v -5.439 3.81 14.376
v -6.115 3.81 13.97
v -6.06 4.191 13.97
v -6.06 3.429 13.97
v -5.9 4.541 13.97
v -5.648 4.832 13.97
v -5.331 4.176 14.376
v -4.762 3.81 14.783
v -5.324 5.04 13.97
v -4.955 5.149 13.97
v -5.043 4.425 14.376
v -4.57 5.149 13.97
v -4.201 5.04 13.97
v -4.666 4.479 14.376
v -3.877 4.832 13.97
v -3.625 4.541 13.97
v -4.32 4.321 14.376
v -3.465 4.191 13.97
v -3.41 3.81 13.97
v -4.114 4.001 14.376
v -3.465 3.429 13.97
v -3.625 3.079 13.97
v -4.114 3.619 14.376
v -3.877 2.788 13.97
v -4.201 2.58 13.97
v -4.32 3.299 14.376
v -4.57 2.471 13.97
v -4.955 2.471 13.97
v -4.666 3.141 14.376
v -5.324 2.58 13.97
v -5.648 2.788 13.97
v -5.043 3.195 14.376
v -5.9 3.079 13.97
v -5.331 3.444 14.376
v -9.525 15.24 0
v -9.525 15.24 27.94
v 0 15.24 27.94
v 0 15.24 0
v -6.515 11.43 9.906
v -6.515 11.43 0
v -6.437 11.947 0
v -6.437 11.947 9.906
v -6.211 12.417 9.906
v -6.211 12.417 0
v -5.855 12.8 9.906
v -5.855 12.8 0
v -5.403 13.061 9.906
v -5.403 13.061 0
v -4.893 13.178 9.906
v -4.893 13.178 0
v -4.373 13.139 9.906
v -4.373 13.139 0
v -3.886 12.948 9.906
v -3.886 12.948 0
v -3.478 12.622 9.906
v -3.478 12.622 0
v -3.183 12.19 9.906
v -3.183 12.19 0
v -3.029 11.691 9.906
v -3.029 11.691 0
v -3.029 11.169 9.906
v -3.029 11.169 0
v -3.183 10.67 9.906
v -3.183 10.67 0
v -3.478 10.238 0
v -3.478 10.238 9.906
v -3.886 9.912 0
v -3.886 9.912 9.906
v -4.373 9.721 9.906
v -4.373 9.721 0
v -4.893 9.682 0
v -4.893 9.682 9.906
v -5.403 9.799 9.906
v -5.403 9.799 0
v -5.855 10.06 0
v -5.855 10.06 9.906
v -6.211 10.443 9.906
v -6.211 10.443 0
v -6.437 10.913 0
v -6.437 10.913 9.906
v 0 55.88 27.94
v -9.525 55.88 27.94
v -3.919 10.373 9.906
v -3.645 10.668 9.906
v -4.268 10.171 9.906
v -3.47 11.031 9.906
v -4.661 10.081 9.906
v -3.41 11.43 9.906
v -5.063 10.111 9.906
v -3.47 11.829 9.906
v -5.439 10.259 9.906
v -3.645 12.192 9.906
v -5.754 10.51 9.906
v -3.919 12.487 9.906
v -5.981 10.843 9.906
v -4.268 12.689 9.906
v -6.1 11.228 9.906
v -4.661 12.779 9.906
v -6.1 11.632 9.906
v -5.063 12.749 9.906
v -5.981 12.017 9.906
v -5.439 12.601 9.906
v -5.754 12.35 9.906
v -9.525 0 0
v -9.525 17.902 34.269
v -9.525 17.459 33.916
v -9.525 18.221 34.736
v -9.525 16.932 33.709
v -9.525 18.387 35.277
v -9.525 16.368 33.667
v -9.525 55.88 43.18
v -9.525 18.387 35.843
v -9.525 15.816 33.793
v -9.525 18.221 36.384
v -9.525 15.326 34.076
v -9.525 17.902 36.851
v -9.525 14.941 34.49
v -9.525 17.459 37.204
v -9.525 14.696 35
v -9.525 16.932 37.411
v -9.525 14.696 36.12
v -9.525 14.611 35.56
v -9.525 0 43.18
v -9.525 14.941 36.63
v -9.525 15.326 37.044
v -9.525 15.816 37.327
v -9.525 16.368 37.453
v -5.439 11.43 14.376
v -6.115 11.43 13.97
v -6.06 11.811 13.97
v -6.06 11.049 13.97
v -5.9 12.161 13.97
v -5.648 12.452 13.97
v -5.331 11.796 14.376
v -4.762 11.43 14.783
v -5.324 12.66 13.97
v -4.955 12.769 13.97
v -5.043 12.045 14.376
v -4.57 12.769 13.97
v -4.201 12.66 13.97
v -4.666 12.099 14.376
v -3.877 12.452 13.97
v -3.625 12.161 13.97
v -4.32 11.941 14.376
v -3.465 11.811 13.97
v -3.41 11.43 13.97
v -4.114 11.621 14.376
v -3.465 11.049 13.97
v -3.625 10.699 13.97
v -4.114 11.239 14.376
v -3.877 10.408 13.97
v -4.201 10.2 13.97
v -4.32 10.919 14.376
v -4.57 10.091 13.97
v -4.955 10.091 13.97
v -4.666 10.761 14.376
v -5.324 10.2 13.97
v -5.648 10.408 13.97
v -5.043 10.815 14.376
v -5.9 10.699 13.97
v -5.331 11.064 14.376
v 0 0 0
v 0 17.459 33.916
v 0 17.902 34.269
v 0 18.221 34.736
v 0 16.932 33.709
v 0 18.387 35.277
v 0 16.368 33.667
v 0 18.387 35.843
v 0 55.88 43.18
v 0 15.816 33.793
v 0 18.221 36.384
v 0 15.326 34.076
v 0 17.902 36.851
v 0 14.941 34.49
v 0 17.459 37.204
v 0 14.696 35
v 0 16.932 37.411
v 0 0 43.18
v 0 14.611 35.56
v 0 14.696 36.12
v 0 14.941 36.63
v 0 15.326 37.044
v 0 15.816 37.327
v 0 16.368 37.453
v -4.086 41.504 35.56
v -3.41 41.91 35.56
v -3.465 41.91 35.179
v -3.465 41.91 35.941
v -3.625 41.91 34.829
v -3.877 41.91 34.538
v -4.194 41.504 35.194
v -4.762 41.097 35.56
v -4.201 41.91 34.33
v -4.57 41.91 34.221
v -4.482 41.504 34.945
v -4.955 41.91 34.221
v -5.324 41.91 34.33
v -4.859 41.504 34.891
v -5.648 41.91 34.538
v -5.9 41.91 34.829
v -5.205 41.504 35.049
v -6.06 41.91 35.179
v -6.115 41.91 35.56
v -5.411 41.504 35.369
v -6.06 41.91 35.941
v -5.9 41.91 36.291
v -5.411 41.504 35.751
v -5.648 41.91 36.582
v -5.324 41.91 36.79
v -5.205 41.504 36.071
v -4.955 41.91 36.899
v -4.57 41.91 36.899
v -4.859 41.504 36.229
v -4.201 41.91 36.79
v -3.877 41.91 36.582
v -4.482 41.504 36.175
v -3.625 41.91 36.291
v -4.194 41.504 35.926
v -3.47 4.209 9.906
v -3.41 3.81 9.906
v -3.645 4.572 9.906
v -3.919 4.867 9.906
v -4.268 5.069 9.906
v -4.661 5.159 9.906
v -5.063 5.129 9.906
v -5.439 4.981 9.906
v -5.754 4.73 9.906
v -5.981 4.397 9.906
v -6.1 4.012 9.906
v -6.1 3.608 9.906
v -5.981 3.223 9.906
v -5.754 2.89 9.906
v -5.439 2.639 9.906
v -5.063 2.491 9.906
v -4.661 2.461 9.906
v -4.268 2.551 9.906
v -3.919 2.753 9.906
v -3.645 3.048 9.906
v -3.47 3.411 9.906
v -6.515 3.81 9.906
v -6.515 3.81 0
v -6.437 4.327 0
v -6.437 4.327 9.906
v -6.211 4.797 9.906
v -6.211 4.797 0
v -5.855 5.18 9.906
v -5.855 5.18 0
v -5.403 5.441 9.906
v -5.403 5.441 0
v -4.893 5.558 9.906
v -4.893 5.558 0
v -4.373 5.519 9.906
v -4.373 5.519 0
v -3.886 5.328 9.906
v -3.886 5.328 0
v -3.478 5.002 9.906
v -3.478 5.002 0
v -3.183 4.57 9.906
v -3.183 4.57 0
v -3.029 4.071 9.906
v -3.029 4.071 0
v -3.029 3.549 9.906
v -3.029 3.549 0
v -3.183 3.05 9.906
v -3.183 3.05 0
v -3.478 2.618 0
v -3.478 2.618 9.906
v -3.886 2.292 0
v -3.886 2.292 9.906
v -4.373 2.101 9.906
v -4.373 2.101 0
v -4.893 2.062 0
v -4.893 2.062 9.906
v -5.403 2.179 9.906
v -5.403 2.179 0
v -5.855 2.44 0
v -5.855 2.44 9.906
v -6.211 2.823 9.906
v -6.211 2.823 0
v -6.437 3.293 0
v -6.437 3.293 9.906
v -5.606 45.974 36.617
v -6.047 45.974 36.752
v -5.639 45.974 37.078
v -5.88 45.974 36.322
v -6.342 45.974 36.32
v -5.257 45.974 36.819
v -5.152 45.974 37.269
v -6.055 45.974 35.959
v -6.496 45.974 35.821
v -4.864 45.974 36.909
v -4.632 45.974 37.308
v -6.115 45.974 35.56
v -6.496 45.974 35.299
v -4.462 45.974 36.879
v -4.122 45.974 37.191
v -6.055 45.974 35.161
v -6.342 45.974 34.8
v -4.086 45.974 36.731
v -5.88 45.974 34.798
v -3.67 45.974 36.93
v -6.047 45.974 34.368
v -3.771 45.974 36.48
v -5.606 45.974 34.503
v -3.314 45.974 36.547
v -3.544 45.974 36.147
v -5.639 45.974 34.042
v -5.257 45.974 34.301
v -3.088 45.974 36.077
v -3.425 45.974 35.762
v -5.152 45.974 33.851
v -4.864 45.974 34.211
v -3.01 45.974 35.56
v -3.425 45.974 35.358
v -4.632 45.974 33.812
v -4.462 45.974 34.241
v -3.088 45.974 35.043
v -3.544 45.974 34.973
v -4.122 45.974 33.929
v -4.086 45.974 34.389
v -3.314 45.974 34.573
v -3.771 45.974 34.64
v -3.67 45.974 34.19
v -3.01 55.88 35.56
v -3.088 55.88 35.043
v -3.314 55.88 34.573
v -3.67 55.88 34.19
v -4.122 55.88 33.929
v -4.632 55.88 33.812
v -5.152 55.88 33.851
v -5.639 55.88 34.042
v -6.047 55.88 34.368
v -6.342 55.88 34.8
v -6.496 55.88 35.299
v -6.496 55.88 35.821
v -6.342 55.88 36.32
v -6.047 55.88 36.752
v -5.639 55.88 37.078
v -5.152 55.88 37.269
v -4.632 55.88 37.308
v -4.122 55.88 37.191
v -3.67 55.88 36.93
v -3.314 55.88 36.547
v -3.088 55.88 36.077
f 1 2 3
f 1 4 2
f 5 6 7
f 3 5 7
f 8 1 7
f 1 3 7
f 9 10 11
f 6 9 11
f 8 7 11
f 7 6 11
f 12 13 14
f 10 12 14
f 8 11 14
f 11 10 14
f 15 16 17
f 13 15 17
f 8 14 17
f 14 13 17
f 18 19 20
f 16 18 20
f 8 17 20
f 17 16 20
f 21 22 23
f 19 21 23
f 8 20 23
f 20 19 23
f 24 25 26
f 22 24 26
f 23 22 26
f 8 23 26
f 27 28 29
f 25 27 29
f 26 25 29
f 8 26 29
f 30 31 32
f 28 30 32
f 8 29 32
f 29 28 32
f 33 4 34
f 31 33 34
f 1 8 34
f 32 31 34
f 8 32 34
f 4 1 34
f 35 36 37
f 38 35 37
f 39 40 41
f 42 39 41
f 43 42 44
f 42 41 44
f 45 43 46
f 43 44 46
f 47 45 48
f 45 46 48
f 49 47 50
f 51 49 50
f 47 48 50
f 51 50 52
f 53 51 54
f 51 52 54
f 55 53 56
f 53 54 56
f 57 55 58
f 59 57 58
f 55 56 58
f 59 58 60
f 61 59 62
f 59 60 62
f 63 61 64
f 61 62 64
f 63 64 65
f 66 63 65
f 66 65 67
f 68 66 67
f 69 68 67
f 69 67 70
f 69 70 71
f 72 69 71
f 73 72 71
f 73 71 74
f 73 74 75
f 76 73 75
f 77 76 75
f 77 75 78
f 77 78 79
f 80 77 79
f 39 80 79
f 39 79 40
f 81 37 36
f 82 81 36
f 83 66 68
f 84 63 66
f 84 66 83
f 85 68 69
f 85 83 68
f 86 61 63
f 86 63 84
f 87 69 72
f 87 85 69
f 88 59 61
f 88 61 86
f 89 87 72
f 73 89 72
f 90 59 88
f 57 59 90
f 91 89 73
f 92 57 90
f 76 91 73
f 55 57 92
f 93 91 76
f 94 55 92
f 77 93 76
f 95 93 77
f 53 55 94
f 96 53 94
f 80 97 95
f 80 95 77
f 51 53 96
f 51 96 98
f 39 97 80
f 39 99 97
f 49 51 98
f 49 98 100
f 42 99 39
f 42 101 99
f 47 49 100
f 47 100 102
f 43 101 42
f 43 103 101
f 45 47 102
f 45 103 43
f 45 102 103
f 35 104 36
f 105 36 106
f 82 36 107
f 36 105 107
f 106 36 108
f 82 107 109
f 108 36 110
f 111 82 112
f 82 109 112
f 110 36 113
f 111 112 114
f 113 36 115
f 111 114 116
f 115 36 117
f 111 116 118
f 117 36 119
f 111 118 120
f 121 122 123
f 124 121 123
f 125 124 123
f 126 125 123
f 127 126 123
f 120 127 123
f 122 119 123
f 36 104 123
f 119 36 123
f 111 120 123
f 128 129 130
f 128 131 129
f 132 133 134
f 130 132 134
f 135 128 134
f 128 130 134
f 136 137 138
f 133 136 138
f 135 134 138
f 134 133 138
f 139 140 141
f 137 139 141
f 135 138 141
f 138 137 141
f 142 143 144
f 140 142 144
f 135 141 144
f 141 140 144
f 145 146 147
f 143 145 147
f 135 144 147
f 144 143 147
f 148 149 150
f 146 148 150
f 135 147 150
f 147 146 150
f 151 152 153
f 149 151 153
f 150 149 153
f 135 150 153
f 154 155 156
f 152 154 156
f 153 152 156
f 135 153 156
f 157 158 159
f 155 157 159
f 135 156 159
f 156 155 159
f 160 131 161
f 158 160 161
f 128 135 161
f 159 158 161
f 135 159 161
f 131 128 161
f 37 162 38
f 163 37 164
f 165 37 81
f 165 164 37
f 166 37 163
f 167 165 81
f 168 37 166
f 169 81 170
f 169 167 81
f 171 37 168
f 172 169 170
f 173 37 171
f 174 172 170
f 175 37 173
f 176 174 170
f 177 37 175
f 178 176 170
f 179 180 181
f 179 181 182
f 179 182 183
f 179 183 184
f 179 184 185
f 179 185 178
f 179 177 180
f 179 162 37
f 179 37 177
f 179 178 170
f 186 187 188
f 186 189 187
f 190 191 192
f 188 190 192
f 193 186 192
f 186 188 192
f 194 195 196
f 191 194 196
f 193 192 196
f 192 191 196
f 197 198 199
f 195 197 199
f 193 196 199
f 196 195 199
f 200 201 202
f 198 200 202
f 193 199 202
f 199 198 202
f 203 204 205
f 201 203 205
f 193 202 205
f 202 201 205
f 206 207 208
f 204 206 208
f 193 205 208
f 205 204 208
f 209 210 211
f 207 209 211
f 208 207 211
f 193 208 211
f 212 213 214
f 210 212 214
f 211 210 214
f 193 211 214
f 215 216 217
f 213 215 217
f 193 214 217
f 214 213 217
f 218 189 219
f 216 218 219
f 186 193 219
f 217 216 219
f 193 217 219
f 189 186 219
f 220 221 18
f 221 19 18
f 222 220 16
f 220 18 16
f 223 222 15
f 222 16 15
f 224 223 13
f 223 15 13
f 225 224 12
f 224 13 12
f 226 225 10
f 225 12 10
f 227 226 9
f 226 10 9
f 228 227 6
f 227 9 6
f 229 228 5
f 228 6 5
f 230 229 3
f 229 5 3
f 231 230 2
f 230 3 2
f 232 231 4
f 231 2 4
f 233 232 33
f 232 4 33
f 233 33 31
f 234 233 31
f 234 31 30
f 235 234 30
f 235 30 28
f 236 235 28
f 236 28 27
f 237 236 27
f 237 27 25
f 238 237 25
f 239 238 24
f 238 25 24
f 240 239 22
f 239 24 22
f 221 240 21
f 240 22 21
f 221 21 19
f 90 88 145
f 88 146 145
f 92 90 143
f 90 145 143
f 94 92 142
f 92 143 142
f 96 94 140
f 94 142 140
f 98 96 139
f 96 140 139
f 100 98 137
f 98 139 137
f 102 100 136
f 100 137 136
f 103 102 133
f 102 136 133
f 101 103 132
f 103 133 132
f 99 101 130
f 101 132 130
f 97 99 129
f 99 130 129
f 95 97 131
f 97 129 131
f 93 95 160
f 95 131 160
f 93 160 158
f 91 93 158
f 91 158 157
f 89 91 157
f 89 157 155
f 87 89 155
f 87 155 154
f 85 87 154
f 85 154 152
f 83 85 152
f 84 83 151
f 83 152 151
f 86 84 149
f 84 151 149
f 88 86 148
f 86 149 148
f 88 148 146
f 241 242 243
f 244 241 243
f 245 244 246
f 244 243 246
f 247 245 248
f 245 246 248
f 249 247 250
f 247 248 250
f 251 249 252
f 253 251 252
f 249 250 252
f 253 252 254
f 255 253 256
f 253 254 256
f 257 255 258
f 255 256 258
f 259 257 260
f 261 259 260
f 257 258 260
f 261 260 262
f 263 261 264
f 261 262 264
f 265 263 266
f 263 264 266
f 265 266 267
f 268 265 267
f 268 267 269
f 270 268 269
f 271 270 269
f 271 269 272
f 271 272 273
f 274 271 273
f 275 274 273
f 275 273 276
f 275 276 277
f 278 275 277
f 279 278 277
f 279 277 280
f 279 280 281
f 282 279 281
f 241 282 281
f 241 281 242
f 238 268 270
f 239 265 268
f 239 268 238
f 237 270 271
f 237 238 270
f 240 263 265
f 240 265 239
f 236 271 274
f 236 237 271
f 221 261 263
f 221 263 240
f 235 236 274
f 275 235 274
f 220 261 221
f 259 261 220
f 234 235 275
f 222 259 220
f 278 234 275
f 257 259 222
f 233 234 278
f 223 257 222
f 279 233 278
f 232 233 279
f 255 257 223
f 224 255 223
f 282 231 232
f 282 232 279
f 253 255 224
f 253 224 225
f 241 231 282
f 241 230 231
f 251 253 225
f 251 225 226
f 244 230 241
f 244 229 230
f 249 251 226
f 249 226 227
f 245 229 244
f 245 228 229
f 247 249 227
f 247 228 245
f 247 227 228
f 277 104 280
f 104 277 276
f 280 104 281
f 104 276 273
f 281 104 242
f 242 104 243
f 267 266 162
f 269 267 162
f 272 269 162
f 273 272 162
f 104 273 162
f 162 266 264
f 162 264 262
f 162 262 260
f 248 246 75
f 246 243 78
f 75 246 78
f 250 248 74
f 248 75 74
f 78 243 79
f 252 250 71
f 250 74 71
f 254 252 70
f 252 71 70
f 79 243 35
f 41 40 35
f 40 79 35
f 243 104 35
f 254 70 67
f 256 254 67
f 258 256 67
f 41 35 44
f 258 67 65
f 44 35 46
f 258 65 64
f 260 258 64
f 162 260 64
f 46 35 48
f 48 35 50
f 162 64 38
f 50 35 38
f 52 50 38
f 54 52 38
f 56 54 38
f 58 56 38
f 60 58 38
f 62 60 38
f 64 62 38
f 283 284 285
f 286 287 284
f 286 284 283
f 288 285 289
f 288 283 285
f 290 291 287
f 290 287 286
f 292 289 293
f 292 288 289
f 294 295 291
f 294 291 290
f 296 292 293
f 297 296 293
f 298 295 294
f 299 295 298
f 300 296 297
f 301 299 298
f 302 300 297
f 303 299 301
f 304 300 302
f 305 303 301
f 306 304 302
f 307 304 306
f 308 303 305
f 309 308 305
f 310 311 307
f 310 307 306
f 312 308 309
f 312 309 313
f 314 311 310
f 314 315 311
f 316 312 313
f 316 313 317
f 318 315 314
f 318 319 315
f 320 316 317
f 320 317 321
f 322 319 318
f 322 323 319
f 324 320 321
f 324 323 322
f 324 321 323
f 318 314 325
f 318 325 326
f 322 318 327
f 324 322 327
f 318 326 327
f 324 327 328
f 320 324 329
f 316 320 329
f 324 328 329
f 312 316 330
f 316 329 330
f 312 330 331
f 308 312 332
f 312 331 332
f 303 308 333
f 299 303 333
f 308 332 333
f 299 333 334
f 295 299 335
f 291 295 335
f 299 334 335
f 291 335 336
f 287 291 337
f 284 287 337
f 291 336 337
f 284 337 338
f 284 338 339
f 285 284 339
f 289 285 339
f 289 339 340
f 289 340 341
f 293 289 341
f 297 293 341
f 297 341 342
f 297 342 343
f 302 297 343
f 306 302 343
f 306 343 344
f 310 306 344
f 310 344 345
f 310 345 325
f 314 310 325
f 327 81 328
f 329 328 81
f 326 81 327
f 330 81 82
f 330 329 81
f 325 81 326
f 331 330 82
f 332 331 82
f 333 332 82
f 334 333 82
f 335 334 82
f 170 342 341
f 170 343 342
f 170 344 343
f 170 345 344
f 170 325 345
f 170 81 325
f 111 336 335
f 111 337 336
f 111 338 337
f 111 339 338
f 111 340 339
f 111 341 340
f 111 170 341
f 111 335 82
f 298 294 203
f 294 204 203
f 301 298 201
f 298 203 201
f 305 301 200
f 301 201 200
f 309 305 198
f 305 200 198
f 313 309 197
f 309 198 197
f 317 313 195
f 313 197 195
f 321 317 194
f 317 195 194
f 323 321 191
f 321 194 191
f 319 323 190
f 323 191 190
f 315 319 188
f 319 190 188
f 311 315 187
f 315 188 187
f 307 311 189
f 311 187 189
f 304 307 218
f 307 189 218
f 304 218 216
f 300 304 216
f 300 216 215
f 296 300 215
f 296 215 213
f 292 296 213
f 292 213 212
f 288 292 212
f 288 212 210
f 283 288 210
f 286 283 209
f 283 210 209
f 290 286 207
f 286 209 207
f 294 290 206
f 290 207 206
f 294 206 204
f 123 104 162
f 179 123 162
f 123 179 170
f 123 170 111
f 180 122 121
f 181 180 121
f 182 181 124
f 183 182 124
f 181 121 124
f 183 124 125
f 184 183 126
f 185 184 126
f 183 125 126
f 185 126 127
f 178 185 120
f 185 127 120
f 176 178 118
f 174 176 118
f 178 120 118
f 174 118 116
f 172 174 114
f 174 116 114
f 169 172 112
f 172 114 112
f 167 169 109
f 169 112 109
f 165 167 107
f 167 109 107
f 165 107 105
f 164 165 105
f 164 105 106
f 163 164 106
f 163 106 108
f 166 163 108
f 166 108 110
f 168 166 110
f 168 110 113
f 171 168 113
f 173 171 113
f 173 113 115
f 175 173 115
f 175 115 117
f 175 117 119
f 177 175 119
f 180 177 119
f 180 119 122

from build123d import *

# Parameters (mm, degrees)
SKETCH1_W                       = 9.525
SKETCH1_H                       = 15.24
EXTRUDE1_DEPTH                  = 43.18
SKETCH4_W                       = 9.525
SKETCH4_H                       = 15.24
EXTRUDE2_DEPTH                  = 40.64
F_6_32_TAPPED_HOLE1_D           = 2.7051
F_6_32_TAPPED_HOLE1_DEPTH       = 13.97
F_6_32_TAPPED_HOLE1_CBORE_D     = 3.5052
F_6_32_TAPPED_HOLE1_CBORE_DEPTH = 9.906
F_6_32_TAPPED_HOLE1_TIP         = 0.81269403
F_6_CLEARANCE_HOLE1_D           = 3.7973
F_6_CLEARANCE_HOLE1_DEPTH       = 9.906
F_6_CLEARANCE_HOLE1_TIP         = 1.140824014
F_6_32_TAPPED_HOLE2_D           = 2.7051
F_6_32_TAPPED_HOLE2_DEPTH       = 13.97
F_6_32_TAPPED_HOLE2_CBORE_D     = 3.5052
F_6_32_TAPPED_HOLE2_CBORE_DEPTH = 9.906
F_6_32_TAPPED_HOLE2_TIP         = 0.81269403


with BuildPart() as part:
    # Sketch1 → Extrude1 (new body)
    with BuildSketch(Plane.XY):
        with Locations((-4.7625, 7.62)):
            Rectangle(SKETCH1_W, SKETCH1_H)
    extrude(amount=EXTRUDE1_DEPTH)

    # Sketch4 → Extrude2 (add)
    with BuildSketch(Plane(origin=(0, 15.24, 0), x_dir=(-1, 0, 0), z_dir=(0, 1, 0))):
        with Locations((4.7625, 35.56)):
            Rectangle(SKETCH4_W, SKETCH4_H)
    extrude(amount=EXTRUDE2_DEPTH)

    # #6-32 Tapped Hole1
    with Locations(Plane(origin=(-4.7625, 11.43, 0), x_dir=(-1, 0, 0), z_dir=(0, 0, -1))):
        with Locations((0, 0), (0, -7.62), (15.003961831, 4.683879058)):
            CounterBoreHole(F_6_32_TAPPED_HOLE1_D / 2, F_6_32_TAPPED_HOLE1_CBORE_D / 2, F_6_32_TAPPED_HOLE1_CBORE_DEPTH, depth=F_6_32_TAPPED_HOLE1_DEPTH)
            with Locations((0, 0, -(F_6_32_TAPPED_HOLE1_DEPTH + F_6_32_TAPPED_HOLE1_TIP / 2))):  # 118° drill point
                Cone(0, F_6_32_TAPPED_HOLE1_D / 2, F_6_32_TAPPED_HOLE1_TIP, mode=Mode.SUBTRACT)

    # #6 Clearance Hole1
    with Locations(Plane(origin=(0, 16.51, 35.56), x_dir=(0, 1, 0), z_dir=(1, 0, 0))):
        with Locations((0, 0)):
            Hole(F_6_CLEARANCE_HOLE1_D / 2, depth=F_6_CLEARANCE_HOLE1_DEPTH)
            with Locations((0, 0, -(F_6_CLEARANCE_HOLE1_DEPTH + F_6_CLEARANCE_HOLE1_TIP / 2))):  # 118° drill point
                Cone(0, F_6_CLEARANCE_HOLE1_D / 2, F_6_CLEARANCE_HOLE1_TIP, mode=Mode.SUBTRACT)

    # #6-32 Tapped Hole2
    with Locations(Plane(origin=(-4.7625, 55.88, 35.56), x_dir=(1, 0, 0), z_dir=(0, 1, 0))):
        with Locations((0, 0)):
            CounterBoreHole(F_6_32_TAPPED_HOLE2_D / 2, F_6_32_TAPPED_HOLE2_CBORE_D / 2, F_6_32_TAPPED_HOLE2_CBORE_DEPTH, depth=F_6_32_TAPPED_HOLE2_DEPTH)
            with Locations((0, 0, -(F_6_32_TAPPED_HOLE2_DEPTH + F_6_32_TAPPED_HOLE2_TIP / 2))):  # 118° drill point
                Cone(0, F_6_32_TAPPED_HOLE2_D / 2, F_6_32_TAPPED_HOLE2_TIP, mode=Mode.SUBTRACT)


solid = part.part
